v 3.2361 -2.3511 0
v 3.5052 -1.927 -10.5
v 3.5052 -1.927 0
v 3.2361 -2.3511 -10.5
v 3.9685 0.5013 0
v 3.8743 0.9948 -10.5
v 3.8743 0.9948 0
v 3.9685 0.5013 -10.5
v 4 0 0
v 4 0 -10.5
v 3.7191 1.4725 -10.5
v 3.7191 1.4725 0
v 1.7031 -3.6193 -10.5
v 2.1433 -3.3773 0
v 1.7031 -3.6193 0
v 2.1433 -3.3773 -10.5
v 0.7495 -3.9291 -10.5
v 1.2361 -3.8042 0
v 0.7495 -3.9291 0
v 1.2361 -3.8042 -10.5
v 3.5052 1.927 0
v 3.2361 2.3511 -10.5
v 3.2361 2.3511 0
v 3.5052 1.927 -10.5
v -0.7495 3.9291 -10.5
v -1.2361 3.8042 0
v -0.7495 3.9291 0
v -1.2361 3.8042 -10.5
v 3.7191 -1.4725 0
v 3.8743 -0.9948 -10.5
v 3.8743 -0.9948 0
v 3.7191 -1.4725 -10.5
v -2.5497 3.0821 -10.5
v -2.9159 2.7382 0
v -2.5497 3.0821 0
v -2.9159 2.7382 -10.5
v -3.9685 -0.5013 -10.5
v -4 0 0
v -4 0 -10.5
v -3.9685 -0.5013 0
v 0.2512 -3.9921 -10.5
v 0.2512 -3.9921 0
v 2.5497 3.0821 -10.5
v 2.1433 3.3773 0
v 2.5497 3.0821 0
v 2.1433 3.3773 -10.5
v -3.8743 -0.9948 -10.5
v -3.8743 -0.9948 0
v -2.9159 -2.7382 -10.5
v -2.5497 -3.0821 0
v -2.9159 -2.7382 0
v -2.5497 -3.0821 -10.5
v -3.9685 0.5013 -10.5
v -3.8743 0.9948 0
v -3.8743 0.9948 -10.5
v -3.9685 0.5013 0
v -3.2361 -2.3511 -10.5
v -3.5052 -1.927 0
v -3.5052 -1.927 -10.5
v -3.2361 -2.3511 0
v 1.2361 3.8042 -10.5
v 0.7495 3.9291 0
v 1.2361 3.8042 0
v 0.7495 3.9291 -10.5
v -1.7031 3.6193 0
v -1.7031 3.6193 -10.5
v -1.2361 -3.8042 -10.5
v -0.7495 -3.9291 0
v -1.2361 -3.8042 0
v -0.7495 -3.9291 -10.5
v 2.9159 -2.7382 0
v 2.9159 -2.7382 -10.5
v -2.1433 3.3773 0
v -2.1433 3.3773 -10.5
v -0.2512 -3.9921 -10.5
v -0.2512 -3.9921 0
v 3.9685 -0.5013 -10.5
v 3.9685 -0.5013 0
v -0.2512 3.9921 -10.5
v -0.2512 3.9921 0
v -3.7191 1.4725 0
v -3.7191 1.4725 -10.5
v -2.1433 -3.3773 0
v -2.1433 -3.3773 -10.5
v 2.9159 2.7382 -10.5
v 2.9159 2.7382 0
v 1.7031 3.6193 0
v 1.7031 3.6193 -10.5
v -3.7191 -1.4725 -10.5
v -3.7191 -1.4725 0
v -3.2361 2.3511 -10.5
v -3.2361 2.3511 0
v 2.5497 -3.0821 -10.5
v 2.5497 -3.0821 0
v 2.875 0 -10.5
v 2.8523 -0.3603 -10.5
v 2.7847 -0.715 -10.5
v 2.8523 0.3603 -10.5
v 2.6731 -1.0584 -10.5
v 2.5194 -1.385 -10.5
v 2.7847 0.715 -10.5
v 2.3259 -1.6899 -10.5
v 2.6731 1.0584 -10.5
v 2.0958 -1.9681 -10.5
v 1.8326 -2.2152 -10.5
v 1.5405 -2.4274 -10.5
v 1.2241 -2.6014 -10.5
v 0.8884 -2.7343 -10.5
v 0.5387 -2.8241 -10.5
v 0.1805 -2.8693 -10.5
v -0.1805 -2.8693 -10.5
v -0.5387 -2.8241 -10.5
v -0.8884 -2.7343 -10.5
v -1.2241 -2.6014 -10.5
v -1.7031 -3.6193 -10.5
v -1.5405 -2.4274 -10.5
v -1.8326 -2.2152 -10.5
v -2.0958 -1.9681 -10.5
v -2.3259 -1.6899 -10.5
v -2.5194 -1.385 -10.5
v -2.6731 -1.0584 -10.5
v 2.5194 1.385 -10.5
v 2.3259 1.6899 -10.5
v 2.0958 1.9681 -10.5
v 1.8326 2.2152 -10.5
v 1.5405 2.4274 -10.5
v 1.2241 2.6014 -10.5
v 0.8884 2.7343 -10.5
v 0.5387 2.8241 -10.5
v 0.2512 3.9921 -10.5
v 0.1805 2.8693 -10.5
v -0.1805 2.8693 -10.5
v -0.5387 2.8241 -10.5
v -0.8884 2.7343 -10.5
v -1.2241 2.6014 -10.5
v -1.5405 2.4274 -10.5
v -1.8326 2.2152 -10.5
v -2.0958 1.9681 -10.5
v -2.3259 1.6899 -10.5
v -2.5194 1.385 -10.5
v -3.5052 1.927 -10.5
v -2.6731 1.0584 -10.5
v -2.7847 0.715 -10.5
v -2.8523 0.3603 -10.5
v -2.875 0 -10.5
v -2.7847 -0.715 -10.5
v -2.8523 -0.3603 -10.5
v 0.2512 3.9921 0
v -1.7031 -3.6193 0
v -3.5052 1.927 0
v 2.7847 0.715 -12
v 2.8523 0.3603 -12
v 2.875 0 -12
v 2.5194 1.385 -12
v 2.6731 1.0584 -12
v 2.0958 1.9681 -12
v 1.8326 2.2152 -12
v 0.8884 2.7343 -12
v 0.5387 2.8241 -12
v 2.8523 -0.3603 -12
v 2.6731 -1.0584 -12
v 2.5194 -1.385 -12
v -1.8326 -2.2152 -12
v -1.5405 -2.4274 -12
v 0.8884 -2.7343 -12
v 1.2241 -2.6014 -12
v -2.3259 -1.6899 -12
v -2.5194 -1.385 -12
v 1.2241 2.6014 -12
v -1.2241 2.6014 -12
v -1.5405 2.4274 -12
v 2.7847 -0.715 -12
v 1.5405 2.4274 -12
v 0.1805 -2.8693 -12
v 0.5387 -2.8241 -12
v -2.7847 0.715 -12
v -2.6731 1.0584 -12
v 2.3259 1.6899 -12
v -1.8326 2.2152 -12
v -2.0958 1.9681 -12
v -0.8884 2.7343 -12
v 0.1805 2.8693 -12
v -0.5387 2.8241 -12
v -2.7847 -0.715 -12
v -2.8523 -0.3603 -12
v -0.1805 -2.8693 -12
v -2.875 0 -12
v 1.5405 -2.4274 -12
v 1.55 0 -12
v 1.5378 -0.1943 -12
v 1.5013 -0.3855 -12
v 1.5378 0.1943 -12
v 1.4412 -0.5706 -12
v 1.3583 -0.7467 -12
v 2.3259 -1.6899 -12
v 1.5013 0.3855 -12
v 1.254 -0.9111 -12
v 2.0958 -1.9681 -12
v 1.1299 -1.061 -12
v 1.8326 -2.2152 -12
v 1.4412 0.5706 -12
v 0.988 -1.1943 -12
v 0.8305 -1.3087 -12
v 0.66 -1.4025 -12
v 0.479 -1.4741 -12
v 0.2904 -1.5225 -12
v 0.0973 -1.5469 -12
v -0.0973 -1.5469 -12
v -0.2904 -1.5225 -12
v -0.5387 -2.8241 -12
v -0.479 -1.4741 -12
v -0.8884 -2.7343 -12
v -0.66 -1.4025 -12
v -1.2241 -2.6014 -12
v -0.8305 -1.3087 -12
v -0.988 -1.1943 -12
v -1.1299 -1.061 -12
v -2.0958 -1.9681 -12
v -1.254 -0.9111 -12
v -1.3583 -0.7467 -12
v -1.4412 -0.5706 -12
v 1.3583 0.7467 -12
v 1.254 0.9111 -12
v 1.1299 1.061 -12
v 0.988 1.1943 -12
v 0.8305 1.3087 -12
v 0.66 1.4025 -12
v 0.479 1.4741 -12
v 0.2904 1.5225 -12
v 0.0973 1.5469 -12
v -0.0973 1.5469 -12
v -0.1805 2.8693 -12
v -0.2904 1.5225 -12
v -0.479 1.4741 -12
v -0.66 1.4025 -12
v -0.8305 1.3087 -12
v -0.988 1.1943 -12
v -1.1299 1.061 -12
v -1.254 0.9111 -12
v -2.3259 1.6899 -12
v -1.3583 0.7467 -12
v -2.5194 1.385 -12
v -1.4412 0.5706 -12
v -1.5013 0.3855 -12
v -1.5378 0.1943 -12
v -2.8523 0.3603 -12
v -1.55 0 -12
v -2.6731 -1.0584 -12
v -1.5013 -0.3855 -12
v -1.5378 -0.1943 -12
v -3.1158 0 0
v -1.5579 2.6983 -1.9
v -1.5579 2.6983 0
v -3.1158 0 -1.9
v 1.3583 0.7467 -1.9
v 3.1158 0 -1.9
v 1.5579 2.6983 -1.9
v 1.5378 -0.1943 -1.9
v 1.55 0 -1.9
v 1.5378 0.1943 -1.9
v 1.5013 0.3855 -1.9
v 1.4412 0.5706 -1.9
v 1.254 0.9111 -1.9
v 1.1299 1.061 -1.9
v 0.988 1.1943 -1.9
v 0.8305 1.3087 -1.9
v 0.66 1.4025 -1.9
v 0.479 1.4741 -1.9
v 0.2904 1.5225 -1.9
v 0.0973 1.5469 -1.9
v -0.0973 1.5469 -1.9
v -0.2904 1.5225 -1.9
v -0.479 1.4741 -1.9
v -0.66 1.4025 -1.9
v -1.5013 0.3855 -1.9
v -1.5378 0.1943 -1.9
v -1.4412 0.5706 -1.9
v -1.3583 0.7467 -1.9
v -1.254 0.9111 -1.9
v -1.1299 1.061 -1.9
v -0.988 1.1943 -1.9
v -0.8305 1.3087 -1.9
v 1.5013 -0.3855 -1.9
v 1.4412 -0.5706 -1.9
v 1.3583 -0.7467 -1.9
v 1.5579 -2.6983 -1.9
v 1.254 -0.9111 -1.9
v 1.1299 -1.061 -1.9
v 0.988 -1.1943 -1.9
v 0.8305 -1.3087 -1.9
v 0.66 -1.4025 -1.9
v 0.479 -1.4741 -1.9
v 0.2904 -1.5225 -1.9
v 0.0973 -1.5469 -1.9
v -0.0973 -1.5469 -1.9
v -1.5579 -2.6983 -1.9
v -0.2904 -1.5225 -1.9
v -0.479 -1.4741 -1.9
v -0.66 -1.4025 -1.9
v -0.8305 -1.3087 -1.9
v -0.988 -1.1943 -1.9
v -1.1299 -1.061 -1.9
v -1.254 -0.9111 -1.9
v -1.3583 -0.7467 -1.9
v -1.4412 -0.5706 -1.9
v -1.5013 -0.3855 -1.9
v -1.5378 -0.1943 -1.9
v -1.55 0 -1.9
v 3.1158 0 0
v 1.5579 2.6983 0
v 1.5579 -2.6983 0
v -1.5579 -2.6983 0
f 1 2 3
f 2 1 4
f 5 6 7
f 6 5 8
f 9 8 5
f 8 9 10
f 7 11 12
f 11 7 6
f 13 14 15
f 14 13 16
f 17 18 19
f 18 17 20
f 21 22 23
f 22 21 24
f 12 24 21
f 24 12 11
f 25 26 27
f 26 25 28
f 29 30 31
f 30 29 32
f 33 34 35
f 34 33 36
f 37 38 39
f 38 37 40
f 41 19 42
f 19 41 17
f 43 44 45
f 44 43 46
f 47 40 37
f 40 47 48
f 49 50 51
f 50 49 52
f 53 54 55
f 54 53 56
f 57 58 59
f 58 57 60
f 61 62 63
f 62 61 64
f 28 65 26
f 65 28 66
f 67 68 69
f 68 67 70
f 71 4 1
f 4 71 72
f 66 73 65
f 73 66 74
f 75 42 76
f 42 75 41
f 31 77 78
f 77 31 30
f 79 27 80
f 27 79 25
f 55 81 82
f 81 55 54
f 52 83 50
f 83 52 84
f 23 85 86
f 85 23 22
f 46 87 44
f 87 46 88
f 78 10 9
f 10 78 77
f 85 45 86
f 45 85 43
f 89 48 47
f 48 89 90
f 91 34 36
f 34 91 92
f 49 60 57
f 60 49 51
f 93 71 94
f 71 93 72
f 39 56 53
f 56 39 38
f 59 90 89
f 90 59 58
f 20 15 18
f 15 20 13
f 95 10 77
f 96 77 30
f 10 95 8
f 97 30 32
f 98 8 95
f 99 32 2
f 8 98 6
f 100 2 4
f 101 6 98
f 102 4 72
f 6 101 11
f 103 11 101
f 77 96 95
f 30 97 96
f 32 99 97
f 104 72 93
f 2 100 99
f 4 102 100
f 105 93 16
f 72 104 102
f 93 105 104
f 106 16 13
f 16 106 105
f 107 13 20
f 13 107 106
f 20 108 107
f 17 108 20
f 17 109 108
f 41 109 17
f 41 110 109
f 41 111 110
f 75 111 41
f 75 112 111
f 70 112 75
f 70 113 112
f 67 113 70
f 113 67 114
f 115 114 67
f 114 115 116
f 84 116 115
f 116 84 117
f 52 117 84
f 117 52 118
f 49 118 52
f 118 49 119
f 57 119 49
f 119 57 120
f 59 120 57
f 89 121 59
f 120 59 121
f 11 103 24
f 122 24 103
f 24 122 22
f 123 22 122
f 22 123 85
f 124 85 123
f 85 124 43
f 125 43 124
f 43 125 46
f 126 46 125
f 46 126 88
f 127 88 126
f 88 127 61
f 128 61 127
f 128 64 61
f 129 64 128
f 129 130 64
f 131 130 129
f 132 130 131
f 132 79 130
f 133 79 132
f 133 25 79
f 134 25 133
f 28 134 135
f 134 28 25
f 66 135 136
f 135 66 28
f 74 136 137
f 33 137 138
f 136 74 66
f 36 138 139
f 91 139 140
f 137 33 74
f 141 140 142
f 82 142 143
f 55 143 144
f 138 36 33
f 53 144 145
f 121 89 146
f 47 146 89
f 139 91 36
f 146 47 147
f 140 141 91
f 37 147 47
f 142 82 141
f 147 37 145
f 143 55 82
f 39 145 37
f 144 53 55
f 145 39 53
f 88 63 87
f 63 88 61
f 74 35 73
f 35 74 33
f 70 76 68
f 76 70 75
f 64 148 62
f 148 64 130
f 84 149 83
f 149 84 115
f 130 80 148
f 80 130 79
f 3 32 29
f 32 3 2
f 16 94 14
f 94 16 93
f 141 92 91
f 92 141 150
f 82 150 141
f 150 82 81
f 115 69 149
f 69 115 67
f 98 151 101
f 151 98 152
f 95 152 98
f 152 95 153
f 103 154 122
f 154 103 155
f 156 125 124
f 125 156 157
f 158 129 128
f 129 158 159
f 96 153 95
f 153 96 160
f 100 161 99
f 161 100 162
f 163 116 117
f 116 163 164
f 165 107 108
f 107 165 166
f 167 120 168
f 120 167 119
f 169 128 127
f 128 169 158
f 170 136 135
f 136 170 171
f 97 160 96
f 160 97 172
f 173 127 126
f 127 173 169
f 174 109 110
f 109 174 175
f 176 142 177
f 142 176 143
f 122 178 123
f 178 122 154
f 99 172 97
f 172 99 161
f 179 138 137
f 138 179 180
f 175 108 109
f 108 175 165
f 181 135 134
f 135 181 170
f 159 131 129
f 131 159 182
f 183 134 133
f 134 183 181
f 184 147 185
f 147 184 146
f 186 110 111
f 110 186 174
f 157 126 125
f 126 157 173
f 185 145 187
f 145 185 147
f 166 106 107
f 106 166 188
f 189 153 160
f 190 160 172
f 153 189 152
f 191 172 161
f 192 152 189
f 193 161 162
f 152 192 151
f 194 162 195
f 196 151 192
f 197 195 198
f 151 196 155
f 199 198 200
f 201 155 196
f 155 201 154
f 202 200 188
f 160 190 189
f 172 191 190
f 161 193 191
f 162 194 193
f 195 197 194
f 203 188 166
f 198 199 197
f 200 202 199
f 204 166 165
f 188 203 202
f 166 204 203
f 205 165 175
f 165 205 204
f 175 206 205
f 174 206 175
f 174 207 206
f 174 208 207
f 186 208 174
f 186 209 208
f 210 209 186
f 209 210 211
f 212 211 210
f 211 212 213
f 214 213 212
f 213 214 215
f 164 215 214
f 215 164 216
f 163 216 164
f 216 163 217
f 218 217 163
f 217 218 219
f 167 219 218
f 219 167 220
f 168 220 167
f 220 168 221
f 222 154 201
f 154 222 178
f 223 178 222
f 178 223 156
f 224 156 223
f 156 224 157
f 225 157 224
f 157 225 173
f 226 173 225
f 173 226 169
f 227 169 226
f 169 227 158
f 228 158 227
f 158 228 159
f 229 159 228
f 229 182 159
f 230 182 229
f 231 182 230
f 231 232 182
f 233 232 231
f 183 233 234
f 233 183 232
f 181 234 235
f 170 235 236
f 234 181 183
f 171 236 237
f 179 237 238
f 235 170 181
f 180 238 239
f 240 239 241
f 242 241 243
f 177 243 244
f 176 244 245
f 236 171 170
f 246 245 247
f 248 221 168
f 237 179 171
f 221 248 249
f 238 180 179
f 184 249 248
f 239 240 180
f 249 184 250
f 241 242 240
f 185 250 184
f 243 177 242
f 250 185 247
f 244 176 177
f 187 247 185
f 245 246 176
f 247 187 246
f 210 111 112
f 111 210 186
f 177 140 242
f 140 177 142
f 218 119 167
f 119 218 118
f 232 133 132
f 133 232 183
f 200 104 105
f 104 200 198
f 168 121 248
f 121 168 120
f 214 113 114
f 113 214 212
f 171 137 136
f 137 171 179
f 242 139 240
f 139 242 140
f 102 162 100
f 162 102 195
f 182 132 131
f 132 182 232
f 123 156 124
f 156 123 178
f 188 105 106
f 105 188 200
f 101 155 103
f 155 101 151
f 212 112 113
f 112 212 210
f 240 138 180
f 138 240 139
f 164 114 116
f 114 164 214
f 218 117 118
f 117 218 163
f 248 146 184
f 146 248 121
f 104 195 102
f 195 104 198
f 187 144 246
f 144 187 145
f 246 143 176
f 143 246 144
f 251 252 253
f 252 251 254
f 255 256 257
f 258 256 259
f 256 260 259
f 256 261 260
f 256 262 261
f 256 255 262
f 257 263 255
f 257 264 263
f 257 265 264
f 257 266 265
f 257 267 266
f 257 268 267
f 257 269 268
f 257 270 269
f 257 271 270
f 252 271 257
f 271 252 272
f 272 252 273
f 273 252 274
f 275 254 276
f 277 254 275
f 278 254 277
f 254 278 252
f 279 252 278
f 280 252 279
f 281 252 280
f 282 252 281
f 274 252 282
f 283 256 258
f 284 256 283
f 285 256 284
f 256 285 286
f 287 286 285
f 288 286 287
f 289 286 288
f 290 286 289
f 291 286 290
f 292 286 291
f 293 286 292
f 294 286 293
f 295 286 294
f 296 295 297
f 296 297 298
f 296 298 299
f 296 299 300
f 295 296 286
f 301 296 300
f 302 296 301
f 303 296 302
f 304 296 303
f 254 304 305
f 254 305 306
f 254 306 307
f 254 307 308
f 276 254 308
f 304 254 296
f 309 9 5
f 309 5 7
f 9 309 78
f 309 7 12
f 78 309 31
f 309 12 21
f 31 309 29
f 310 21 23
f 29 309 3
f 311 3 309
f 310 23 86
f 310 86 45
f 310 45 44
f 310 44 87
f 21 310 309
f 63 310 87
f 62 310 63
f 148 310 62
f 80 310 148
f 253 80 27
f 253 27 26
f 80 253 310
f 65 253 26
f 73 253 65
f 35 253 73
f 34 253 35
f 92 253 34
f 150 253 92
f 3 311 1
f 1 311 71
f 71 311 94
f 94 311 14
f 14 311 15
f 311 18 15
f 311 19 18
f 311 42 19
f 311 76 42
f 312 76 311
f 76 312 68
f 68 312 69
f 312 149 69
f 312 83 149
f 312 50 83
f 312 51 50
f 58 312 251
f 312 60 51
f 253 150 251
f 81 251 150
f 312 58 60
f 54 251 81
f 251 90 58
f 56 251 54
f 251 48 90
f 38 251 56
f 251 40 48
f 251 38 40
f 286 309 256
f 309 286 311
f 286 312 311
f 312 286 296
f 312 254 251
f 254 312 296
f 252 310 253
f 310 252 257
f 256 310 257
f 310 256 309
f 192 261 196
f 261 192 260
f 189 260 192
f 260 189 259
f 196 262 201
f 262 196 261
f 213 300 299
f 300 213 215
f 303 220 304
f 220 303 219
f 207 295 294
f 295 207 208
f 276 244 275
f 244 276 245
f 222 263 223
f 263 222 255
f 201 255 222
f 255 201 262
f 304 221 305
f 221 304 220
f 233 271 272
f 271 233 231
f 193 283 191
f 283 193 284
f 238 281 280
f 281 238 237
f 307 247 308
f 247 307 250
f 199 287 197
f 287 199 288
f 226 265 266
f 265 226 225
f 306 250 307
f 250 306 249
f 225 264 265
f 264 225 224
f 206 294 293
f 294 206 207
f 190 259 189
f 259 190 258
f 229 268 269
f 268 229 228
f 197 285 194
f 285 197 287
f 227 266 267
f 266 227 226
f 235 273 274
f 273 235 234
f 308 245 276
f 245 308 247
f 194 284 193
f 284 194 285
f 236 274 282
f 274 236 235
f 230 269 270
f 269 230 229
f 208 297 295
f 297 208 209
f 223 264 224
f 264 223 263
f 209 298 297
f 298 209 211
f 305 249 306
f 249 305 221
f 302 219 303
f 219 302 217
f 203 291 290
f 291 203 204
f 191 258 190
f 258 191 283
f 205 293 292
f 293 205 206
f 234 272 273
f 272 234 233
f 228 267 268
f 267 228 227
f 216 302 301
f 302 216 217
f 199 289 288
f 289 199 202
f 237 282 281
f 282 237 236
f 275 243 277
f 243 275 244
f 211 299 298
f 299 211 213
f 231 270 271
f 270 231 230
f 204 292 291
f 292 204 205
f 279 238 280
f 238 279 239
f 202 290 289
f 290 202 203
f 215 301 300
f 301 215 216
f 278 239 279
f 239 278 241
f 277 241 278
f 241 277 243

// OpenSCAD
$fn = 50;

difference() {
	union() {
		translate(v = [0, 0, -10.5]) {
			cylinder(h = 13.5, r = 4.0);
		}
		#translate(v = [0, 0, -12.0]) {
			cylinder(h = 12, r = 2.875);
		}
	}
	union() {
		translate(v = [0, 0, 0]) {
			rotate(a = [0, 0, 0]) {
				difference() {
					union() {
						translate(v = [0, 0, -1.9]) {
							linear_extrude(height = 1.9) {
								polygon(points = [[3.1158, 0.0], [1.5579000000000005, 2.698361953111554], [-1.5578999999999994, 2.6983619531115544], [-3.1158, 3.815754496783323e-16], [-1.5579000000000014, -2.6983619531115535], [1.557899999999998, -2.6983619531115552]]);
							}
						}
					}
					union();
				}
			}
		}
		#cylinder(h = 3, r = 5.0);
		#translate(v = [0, 0, -100.0]) {
			cylinder(h = 200, r = 1.55);
		}
	}
}
